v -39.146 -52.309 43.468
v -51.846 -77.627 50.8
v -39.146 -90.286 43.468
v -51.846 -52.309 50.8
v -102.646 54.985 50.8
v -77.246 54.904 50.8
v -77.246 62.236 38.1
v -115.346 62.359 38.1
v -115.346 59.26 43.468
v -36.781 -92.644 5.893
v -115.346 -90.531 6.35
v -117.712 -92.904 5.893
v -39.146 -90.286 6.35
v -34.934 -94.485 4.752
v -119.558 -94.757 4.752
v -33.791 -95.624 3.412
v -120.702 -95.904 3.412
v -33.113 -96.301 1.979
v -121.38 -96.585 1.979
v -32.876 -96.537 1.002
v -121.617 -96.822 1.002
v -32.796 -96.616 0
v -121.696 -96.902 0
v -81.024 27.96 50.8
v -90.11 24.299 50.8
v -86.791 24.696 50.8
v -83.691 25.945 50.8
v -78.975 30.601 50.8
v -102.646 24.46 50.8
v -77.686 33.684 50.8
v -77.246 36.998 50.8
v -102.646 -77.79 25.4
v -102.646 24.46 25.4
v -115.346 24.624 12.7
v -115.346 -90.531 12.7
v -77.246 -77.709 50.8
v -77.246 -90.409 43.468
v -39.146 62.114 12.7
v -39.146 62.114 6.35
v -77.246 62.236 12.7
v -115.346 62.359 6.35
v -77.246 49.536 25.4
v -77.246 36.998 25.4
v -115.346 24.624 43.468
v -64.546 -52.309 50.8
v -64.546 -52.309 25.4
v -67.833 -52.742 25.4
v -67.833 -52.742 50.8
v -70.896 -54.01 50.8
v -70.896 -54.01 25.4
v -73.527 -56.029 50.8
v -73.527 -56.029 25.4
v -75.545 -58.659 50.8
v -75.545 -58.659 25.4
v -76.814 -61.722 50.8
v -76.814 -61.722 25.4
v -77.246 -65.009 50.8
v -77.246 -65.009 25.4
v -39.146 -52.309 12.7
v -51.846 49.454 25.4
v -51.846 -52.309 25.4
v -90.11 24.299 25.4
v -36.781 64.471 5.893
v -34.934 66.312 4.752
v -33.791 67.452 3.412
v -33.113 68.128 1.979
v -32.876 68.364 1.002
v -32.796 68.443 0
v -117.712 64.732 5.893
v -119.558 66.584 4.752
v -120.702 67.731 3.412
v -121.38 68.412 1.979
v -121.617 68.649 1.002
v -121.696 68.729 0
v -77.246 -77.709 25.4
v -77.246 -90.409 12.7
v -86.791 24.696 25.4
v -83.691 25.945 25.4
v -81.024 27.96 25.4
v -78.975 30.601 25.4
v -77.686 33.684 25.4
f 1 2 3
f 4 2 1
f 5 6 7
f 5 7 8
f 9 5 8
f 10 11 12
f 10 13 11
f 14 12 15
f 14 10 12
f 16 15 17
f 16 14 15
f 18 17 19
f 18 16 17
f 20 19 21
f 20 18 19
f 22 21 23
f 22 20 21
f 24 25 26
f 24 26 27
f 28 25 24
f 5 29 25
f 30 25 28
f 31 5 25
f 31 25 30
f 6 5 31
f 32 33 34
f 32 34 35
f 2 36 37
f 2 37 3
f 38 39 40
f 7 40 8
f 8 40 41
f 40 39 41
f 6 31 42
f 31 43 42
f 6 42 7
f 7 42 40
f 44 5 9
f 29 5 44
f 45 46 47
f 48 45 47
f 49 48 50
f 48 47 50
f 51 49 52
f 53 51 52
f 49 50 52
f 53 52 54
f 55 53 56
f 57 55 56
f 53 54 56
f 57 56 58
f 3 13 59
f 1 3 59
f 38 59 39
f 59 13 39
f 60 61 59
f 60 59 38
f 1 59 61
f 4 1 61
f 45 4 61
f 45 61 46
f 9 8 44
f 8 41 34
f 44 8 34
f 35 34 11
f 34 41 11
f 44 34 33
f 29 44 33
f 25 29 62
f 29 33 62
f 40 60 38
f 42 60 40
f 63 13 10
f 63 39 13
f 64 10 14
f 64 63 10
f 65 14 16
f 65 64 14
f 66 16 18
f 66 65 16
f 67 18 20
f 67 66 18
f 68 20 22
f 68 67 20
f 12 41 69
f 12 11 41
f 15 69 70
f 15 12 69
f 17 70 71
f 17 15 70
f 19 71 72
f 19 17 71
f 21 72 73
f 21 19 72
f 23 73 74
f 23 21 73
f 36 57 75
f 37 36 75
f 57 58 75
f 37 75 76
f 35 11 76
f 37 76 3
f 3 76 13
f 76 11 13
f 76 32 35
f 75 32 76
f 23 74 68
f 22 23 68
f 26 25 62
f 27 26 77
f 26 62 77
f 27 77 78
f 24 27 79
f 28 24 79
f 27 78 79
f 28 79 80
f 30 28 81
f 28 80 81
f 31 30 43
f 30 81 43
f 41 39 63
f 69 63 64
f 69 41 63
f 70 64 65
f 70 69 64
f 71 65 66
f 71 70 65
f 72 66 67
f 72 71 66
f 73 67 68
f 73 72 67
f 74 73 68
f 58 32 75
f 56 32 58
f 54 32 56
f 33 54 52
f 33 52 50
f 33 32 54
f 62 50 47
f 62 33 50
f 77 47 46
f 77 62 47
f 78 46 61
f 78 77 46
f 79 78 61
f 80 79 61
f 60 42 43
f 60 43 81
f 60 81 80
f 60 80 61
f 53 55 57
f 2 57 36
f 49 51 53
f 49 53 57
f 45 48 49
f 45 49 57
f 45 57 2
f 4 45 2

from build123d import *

# Parameters (mm, degrees)
F1_DEPTH    = 6.35
F2_DEPTH    = 25.4
F3_DEPTH    = 50.8
F4_R        = 6.34999
F5_SIZE     = 12.7
F6_C1_SIZE2 = 12.7
F6_C1_SIZE  = 7.3323484187
F6_C2_SIZE2 = 12.7
F6_C2_SIZE  = 7.3323484187
F6_C3_SIZE2 = 7.3323484187
F6_C3_SIZE  = 12.7
F6_C4_SIZE2 = 12.7
F6_C4_SIZE  = 7.3323484187


# Not quite as in the source:
# - a fillet or chamfer is up to 0.001 mm smaller than in the source, because OpenCascade refuses the exact size


with BuildPart() as f1:
    # F0 (on Top) → F1 (new body)
    with BuildSketch(Plane.XY):
        Polygon((-32.7964108223, 68.4432678408), (-121.6964108223, 68.7291226315), (-121.6964108223, -96.9018127685), (-32.7964108223, -96.6159616778), align=None)
        Polygon((-115.3464108223, 24.6241450903), (-115.3464108223, 62.3586716052), (-77.2464108223, 62.2361624092), (-39.1464108223, 62.1136532132), (-39.1464108223, -52.3088543971), (-39.1464108223, -90.2863467868), (-77.2464108223, -90.4088543971), (-115.3464108223, -90.5313620074), align=None, mode=Mode.SUBTRACT)
    extrude(amount=F1_DEPTH)

    # F0 (on Top) → F2 (join)
    with BuildSketch(Plane.XY):
        with BuildLine():
            Line((-90.1101133053, 24.2988232152), (-115.3464108223, 24.6241450903))
            Line((-115.3464108223, 24.6241450903), (-115.3464108223, -90.5313620074))
            Line((-115.3464108223, -90.5313620074), (-77.2464108223, -90.4088543971))
            Line((-77.2464108223, -90.4088543971), (-77.2464108223, -65.0088543971))
            ThreePointArc((-77.2464108223, -65.0088543971), (-73.5266669434, -56.028598276), (-64.5464108223, -52.3088543971))
            Line((-64.5464108223, -52.3088543971), (-39.1464108223, -52.3088543971))
            Line((-39.1464108223, -52.3088543971), (-39.1464108223, 62.1136532132))
            Line((-39.1464108223, 62.1136532132), (-77.2464108223, 62.2361624092))
            Line((-77.2464108223, 62.2361624092), (-77.2464108223, 36.9977681122))
            ThreePointArc((-77.2464108223, 36.9977681122), (-81.0242199909, 27.9598197407), (-90.1101133053, 24.2988232152))
        make_face()
    extrude(amount=F2_DEPTH)

    # F0 (on Top) → F3 (join)
    with BuildSketch(Plane.XY):
        with BuildLine():
            Line((-77.2464108223, -65.0088543971), (-77.2464108223, -90.4088543971))
            Line((-77.2464108223, -90.4088543971), (-39.1464108223, -90.2863467868))
            Line((-39.1464108223, -90.2863467868), (-39.1464108223, -52.3088543971))
            Line((-39.1464108223, -52.3088543971), (-64.5464108223, -52.3088543971))
            ThreePointArc((-64.5464108223, -52.3088543971), (-73.5266669434, -56.028598276), (-77.2464108223, -65.0088543971))
        make_face()
        with BuildLine():
            Line((-77.2464108223, 62.2361624092), (-115.3464108223, 62.3586716052))
            Line((-115.3464108223, 62.3586716052), (-115.3464108223, 24.6241450903))
            Line((-115.3464108223, 24.6241450903), (-90.1101133053, 24.2988232152))
            ThreePointArc((-90.1101133053, 24.2988232152), (-81.0242199909, 27.9598197407), (-77.2464108223, 36.9977681122))
            Line((-77.2464108223, 36.9977681122), (-77.2464108223, 62.2361624092))
        make_face()
    extrude(amount=F3_DEPTH)

    # F4 (radius 6.35 in the source; OpenCascade refuses exactly that, so slightly less here)
    f4_edges = [f1.edges().sort_by_distance(p)[0] for p in [
        (-77.246411, -96.758887, 6.35),
        (-32.796411, -14.086347, 6.35),
        (-77.246411, 68.586195, 6.35),
        (-121.696411, -14.086345, 6.35),
    ]]
    fillet(f4_edges, radius=F4_R)

    # F5
    f5_edges = [f1.edges().sort_by_distance(p)[0] for p in [
        (-96.296411, -90.470108, 25.4),
        (-39.146411, 4.902399, 25.4),
        (-115.346411, -32.953608, 25.4),
        (-58.196411, 62.174908, 25.4),
    ]]
    chamfer(f5_edges, length=F5_SIZE)

    # F6: chamfer of 12.7 x 7.3323484187 on 4 edges, made by hand

    # F6_c1
    f6_c1_edges = [f1.edges().sort_by_distance(p)[0] for p in [
        (-115.3464108223, 43.4914083477, 50.8),
    ]]
    f6_c1_side = f1.faces().sort_by_distance((-115.3464108223, 43.4914083477, 50.6533530316))[0]
    chamfer(f6_c1_edges, length=F6_C1_SIZE, length2=F6_C1_SIZE2, reference=f6_c1_side)

    # F6_c2
    f6_c2_edges = [f1.edges().sort_by_distance(p)[0] for p in [
        (-58.1964108223, -90.3476005919, 50.8),
    ]]
    f6_c2_side = f1.faces().sort_by_distance((-58.1964108223, -90.3476005919, 50.6533530316))[0]
    chamfer(f6_c2_edges, length=F6_C2_SIZE, length2=F6_C2_SIZE2, reference=f6_c2_side)

    # F6_c3
    f6_c3_edges = [f1.edges().sort_by_distance(p)[0] for p in [
        (-89.9464108223, 62.2769988079, 50.8),
    ]]
    f6_c3_side = f1.faces().sort_by_distance((-89.9464108223, 62.2769988079, 50.6533530316))[0]
    chamfer(f6_c3_edges, length=F6_C3_SIZE, length2=F6_C3_SIZE2, reference=f6_c3_side)

    # F6_c4
    f6_c4_edges = [f1.edges().sort_by_distance(p)[0] for p in [
        (-39.1464108223, -64.9475677659, 50.8),
    ]]
    f6_c4_side = f1.faces().sort_by_distance((-39.1464108223, -64.9475677659, 50.6533530316))[0]
    chamfer(f6_c4_edges, length=F6_C4_SIZE, length2=F6_C4_SIZE2, reference=f6_c4_side)


solid = f1.part
